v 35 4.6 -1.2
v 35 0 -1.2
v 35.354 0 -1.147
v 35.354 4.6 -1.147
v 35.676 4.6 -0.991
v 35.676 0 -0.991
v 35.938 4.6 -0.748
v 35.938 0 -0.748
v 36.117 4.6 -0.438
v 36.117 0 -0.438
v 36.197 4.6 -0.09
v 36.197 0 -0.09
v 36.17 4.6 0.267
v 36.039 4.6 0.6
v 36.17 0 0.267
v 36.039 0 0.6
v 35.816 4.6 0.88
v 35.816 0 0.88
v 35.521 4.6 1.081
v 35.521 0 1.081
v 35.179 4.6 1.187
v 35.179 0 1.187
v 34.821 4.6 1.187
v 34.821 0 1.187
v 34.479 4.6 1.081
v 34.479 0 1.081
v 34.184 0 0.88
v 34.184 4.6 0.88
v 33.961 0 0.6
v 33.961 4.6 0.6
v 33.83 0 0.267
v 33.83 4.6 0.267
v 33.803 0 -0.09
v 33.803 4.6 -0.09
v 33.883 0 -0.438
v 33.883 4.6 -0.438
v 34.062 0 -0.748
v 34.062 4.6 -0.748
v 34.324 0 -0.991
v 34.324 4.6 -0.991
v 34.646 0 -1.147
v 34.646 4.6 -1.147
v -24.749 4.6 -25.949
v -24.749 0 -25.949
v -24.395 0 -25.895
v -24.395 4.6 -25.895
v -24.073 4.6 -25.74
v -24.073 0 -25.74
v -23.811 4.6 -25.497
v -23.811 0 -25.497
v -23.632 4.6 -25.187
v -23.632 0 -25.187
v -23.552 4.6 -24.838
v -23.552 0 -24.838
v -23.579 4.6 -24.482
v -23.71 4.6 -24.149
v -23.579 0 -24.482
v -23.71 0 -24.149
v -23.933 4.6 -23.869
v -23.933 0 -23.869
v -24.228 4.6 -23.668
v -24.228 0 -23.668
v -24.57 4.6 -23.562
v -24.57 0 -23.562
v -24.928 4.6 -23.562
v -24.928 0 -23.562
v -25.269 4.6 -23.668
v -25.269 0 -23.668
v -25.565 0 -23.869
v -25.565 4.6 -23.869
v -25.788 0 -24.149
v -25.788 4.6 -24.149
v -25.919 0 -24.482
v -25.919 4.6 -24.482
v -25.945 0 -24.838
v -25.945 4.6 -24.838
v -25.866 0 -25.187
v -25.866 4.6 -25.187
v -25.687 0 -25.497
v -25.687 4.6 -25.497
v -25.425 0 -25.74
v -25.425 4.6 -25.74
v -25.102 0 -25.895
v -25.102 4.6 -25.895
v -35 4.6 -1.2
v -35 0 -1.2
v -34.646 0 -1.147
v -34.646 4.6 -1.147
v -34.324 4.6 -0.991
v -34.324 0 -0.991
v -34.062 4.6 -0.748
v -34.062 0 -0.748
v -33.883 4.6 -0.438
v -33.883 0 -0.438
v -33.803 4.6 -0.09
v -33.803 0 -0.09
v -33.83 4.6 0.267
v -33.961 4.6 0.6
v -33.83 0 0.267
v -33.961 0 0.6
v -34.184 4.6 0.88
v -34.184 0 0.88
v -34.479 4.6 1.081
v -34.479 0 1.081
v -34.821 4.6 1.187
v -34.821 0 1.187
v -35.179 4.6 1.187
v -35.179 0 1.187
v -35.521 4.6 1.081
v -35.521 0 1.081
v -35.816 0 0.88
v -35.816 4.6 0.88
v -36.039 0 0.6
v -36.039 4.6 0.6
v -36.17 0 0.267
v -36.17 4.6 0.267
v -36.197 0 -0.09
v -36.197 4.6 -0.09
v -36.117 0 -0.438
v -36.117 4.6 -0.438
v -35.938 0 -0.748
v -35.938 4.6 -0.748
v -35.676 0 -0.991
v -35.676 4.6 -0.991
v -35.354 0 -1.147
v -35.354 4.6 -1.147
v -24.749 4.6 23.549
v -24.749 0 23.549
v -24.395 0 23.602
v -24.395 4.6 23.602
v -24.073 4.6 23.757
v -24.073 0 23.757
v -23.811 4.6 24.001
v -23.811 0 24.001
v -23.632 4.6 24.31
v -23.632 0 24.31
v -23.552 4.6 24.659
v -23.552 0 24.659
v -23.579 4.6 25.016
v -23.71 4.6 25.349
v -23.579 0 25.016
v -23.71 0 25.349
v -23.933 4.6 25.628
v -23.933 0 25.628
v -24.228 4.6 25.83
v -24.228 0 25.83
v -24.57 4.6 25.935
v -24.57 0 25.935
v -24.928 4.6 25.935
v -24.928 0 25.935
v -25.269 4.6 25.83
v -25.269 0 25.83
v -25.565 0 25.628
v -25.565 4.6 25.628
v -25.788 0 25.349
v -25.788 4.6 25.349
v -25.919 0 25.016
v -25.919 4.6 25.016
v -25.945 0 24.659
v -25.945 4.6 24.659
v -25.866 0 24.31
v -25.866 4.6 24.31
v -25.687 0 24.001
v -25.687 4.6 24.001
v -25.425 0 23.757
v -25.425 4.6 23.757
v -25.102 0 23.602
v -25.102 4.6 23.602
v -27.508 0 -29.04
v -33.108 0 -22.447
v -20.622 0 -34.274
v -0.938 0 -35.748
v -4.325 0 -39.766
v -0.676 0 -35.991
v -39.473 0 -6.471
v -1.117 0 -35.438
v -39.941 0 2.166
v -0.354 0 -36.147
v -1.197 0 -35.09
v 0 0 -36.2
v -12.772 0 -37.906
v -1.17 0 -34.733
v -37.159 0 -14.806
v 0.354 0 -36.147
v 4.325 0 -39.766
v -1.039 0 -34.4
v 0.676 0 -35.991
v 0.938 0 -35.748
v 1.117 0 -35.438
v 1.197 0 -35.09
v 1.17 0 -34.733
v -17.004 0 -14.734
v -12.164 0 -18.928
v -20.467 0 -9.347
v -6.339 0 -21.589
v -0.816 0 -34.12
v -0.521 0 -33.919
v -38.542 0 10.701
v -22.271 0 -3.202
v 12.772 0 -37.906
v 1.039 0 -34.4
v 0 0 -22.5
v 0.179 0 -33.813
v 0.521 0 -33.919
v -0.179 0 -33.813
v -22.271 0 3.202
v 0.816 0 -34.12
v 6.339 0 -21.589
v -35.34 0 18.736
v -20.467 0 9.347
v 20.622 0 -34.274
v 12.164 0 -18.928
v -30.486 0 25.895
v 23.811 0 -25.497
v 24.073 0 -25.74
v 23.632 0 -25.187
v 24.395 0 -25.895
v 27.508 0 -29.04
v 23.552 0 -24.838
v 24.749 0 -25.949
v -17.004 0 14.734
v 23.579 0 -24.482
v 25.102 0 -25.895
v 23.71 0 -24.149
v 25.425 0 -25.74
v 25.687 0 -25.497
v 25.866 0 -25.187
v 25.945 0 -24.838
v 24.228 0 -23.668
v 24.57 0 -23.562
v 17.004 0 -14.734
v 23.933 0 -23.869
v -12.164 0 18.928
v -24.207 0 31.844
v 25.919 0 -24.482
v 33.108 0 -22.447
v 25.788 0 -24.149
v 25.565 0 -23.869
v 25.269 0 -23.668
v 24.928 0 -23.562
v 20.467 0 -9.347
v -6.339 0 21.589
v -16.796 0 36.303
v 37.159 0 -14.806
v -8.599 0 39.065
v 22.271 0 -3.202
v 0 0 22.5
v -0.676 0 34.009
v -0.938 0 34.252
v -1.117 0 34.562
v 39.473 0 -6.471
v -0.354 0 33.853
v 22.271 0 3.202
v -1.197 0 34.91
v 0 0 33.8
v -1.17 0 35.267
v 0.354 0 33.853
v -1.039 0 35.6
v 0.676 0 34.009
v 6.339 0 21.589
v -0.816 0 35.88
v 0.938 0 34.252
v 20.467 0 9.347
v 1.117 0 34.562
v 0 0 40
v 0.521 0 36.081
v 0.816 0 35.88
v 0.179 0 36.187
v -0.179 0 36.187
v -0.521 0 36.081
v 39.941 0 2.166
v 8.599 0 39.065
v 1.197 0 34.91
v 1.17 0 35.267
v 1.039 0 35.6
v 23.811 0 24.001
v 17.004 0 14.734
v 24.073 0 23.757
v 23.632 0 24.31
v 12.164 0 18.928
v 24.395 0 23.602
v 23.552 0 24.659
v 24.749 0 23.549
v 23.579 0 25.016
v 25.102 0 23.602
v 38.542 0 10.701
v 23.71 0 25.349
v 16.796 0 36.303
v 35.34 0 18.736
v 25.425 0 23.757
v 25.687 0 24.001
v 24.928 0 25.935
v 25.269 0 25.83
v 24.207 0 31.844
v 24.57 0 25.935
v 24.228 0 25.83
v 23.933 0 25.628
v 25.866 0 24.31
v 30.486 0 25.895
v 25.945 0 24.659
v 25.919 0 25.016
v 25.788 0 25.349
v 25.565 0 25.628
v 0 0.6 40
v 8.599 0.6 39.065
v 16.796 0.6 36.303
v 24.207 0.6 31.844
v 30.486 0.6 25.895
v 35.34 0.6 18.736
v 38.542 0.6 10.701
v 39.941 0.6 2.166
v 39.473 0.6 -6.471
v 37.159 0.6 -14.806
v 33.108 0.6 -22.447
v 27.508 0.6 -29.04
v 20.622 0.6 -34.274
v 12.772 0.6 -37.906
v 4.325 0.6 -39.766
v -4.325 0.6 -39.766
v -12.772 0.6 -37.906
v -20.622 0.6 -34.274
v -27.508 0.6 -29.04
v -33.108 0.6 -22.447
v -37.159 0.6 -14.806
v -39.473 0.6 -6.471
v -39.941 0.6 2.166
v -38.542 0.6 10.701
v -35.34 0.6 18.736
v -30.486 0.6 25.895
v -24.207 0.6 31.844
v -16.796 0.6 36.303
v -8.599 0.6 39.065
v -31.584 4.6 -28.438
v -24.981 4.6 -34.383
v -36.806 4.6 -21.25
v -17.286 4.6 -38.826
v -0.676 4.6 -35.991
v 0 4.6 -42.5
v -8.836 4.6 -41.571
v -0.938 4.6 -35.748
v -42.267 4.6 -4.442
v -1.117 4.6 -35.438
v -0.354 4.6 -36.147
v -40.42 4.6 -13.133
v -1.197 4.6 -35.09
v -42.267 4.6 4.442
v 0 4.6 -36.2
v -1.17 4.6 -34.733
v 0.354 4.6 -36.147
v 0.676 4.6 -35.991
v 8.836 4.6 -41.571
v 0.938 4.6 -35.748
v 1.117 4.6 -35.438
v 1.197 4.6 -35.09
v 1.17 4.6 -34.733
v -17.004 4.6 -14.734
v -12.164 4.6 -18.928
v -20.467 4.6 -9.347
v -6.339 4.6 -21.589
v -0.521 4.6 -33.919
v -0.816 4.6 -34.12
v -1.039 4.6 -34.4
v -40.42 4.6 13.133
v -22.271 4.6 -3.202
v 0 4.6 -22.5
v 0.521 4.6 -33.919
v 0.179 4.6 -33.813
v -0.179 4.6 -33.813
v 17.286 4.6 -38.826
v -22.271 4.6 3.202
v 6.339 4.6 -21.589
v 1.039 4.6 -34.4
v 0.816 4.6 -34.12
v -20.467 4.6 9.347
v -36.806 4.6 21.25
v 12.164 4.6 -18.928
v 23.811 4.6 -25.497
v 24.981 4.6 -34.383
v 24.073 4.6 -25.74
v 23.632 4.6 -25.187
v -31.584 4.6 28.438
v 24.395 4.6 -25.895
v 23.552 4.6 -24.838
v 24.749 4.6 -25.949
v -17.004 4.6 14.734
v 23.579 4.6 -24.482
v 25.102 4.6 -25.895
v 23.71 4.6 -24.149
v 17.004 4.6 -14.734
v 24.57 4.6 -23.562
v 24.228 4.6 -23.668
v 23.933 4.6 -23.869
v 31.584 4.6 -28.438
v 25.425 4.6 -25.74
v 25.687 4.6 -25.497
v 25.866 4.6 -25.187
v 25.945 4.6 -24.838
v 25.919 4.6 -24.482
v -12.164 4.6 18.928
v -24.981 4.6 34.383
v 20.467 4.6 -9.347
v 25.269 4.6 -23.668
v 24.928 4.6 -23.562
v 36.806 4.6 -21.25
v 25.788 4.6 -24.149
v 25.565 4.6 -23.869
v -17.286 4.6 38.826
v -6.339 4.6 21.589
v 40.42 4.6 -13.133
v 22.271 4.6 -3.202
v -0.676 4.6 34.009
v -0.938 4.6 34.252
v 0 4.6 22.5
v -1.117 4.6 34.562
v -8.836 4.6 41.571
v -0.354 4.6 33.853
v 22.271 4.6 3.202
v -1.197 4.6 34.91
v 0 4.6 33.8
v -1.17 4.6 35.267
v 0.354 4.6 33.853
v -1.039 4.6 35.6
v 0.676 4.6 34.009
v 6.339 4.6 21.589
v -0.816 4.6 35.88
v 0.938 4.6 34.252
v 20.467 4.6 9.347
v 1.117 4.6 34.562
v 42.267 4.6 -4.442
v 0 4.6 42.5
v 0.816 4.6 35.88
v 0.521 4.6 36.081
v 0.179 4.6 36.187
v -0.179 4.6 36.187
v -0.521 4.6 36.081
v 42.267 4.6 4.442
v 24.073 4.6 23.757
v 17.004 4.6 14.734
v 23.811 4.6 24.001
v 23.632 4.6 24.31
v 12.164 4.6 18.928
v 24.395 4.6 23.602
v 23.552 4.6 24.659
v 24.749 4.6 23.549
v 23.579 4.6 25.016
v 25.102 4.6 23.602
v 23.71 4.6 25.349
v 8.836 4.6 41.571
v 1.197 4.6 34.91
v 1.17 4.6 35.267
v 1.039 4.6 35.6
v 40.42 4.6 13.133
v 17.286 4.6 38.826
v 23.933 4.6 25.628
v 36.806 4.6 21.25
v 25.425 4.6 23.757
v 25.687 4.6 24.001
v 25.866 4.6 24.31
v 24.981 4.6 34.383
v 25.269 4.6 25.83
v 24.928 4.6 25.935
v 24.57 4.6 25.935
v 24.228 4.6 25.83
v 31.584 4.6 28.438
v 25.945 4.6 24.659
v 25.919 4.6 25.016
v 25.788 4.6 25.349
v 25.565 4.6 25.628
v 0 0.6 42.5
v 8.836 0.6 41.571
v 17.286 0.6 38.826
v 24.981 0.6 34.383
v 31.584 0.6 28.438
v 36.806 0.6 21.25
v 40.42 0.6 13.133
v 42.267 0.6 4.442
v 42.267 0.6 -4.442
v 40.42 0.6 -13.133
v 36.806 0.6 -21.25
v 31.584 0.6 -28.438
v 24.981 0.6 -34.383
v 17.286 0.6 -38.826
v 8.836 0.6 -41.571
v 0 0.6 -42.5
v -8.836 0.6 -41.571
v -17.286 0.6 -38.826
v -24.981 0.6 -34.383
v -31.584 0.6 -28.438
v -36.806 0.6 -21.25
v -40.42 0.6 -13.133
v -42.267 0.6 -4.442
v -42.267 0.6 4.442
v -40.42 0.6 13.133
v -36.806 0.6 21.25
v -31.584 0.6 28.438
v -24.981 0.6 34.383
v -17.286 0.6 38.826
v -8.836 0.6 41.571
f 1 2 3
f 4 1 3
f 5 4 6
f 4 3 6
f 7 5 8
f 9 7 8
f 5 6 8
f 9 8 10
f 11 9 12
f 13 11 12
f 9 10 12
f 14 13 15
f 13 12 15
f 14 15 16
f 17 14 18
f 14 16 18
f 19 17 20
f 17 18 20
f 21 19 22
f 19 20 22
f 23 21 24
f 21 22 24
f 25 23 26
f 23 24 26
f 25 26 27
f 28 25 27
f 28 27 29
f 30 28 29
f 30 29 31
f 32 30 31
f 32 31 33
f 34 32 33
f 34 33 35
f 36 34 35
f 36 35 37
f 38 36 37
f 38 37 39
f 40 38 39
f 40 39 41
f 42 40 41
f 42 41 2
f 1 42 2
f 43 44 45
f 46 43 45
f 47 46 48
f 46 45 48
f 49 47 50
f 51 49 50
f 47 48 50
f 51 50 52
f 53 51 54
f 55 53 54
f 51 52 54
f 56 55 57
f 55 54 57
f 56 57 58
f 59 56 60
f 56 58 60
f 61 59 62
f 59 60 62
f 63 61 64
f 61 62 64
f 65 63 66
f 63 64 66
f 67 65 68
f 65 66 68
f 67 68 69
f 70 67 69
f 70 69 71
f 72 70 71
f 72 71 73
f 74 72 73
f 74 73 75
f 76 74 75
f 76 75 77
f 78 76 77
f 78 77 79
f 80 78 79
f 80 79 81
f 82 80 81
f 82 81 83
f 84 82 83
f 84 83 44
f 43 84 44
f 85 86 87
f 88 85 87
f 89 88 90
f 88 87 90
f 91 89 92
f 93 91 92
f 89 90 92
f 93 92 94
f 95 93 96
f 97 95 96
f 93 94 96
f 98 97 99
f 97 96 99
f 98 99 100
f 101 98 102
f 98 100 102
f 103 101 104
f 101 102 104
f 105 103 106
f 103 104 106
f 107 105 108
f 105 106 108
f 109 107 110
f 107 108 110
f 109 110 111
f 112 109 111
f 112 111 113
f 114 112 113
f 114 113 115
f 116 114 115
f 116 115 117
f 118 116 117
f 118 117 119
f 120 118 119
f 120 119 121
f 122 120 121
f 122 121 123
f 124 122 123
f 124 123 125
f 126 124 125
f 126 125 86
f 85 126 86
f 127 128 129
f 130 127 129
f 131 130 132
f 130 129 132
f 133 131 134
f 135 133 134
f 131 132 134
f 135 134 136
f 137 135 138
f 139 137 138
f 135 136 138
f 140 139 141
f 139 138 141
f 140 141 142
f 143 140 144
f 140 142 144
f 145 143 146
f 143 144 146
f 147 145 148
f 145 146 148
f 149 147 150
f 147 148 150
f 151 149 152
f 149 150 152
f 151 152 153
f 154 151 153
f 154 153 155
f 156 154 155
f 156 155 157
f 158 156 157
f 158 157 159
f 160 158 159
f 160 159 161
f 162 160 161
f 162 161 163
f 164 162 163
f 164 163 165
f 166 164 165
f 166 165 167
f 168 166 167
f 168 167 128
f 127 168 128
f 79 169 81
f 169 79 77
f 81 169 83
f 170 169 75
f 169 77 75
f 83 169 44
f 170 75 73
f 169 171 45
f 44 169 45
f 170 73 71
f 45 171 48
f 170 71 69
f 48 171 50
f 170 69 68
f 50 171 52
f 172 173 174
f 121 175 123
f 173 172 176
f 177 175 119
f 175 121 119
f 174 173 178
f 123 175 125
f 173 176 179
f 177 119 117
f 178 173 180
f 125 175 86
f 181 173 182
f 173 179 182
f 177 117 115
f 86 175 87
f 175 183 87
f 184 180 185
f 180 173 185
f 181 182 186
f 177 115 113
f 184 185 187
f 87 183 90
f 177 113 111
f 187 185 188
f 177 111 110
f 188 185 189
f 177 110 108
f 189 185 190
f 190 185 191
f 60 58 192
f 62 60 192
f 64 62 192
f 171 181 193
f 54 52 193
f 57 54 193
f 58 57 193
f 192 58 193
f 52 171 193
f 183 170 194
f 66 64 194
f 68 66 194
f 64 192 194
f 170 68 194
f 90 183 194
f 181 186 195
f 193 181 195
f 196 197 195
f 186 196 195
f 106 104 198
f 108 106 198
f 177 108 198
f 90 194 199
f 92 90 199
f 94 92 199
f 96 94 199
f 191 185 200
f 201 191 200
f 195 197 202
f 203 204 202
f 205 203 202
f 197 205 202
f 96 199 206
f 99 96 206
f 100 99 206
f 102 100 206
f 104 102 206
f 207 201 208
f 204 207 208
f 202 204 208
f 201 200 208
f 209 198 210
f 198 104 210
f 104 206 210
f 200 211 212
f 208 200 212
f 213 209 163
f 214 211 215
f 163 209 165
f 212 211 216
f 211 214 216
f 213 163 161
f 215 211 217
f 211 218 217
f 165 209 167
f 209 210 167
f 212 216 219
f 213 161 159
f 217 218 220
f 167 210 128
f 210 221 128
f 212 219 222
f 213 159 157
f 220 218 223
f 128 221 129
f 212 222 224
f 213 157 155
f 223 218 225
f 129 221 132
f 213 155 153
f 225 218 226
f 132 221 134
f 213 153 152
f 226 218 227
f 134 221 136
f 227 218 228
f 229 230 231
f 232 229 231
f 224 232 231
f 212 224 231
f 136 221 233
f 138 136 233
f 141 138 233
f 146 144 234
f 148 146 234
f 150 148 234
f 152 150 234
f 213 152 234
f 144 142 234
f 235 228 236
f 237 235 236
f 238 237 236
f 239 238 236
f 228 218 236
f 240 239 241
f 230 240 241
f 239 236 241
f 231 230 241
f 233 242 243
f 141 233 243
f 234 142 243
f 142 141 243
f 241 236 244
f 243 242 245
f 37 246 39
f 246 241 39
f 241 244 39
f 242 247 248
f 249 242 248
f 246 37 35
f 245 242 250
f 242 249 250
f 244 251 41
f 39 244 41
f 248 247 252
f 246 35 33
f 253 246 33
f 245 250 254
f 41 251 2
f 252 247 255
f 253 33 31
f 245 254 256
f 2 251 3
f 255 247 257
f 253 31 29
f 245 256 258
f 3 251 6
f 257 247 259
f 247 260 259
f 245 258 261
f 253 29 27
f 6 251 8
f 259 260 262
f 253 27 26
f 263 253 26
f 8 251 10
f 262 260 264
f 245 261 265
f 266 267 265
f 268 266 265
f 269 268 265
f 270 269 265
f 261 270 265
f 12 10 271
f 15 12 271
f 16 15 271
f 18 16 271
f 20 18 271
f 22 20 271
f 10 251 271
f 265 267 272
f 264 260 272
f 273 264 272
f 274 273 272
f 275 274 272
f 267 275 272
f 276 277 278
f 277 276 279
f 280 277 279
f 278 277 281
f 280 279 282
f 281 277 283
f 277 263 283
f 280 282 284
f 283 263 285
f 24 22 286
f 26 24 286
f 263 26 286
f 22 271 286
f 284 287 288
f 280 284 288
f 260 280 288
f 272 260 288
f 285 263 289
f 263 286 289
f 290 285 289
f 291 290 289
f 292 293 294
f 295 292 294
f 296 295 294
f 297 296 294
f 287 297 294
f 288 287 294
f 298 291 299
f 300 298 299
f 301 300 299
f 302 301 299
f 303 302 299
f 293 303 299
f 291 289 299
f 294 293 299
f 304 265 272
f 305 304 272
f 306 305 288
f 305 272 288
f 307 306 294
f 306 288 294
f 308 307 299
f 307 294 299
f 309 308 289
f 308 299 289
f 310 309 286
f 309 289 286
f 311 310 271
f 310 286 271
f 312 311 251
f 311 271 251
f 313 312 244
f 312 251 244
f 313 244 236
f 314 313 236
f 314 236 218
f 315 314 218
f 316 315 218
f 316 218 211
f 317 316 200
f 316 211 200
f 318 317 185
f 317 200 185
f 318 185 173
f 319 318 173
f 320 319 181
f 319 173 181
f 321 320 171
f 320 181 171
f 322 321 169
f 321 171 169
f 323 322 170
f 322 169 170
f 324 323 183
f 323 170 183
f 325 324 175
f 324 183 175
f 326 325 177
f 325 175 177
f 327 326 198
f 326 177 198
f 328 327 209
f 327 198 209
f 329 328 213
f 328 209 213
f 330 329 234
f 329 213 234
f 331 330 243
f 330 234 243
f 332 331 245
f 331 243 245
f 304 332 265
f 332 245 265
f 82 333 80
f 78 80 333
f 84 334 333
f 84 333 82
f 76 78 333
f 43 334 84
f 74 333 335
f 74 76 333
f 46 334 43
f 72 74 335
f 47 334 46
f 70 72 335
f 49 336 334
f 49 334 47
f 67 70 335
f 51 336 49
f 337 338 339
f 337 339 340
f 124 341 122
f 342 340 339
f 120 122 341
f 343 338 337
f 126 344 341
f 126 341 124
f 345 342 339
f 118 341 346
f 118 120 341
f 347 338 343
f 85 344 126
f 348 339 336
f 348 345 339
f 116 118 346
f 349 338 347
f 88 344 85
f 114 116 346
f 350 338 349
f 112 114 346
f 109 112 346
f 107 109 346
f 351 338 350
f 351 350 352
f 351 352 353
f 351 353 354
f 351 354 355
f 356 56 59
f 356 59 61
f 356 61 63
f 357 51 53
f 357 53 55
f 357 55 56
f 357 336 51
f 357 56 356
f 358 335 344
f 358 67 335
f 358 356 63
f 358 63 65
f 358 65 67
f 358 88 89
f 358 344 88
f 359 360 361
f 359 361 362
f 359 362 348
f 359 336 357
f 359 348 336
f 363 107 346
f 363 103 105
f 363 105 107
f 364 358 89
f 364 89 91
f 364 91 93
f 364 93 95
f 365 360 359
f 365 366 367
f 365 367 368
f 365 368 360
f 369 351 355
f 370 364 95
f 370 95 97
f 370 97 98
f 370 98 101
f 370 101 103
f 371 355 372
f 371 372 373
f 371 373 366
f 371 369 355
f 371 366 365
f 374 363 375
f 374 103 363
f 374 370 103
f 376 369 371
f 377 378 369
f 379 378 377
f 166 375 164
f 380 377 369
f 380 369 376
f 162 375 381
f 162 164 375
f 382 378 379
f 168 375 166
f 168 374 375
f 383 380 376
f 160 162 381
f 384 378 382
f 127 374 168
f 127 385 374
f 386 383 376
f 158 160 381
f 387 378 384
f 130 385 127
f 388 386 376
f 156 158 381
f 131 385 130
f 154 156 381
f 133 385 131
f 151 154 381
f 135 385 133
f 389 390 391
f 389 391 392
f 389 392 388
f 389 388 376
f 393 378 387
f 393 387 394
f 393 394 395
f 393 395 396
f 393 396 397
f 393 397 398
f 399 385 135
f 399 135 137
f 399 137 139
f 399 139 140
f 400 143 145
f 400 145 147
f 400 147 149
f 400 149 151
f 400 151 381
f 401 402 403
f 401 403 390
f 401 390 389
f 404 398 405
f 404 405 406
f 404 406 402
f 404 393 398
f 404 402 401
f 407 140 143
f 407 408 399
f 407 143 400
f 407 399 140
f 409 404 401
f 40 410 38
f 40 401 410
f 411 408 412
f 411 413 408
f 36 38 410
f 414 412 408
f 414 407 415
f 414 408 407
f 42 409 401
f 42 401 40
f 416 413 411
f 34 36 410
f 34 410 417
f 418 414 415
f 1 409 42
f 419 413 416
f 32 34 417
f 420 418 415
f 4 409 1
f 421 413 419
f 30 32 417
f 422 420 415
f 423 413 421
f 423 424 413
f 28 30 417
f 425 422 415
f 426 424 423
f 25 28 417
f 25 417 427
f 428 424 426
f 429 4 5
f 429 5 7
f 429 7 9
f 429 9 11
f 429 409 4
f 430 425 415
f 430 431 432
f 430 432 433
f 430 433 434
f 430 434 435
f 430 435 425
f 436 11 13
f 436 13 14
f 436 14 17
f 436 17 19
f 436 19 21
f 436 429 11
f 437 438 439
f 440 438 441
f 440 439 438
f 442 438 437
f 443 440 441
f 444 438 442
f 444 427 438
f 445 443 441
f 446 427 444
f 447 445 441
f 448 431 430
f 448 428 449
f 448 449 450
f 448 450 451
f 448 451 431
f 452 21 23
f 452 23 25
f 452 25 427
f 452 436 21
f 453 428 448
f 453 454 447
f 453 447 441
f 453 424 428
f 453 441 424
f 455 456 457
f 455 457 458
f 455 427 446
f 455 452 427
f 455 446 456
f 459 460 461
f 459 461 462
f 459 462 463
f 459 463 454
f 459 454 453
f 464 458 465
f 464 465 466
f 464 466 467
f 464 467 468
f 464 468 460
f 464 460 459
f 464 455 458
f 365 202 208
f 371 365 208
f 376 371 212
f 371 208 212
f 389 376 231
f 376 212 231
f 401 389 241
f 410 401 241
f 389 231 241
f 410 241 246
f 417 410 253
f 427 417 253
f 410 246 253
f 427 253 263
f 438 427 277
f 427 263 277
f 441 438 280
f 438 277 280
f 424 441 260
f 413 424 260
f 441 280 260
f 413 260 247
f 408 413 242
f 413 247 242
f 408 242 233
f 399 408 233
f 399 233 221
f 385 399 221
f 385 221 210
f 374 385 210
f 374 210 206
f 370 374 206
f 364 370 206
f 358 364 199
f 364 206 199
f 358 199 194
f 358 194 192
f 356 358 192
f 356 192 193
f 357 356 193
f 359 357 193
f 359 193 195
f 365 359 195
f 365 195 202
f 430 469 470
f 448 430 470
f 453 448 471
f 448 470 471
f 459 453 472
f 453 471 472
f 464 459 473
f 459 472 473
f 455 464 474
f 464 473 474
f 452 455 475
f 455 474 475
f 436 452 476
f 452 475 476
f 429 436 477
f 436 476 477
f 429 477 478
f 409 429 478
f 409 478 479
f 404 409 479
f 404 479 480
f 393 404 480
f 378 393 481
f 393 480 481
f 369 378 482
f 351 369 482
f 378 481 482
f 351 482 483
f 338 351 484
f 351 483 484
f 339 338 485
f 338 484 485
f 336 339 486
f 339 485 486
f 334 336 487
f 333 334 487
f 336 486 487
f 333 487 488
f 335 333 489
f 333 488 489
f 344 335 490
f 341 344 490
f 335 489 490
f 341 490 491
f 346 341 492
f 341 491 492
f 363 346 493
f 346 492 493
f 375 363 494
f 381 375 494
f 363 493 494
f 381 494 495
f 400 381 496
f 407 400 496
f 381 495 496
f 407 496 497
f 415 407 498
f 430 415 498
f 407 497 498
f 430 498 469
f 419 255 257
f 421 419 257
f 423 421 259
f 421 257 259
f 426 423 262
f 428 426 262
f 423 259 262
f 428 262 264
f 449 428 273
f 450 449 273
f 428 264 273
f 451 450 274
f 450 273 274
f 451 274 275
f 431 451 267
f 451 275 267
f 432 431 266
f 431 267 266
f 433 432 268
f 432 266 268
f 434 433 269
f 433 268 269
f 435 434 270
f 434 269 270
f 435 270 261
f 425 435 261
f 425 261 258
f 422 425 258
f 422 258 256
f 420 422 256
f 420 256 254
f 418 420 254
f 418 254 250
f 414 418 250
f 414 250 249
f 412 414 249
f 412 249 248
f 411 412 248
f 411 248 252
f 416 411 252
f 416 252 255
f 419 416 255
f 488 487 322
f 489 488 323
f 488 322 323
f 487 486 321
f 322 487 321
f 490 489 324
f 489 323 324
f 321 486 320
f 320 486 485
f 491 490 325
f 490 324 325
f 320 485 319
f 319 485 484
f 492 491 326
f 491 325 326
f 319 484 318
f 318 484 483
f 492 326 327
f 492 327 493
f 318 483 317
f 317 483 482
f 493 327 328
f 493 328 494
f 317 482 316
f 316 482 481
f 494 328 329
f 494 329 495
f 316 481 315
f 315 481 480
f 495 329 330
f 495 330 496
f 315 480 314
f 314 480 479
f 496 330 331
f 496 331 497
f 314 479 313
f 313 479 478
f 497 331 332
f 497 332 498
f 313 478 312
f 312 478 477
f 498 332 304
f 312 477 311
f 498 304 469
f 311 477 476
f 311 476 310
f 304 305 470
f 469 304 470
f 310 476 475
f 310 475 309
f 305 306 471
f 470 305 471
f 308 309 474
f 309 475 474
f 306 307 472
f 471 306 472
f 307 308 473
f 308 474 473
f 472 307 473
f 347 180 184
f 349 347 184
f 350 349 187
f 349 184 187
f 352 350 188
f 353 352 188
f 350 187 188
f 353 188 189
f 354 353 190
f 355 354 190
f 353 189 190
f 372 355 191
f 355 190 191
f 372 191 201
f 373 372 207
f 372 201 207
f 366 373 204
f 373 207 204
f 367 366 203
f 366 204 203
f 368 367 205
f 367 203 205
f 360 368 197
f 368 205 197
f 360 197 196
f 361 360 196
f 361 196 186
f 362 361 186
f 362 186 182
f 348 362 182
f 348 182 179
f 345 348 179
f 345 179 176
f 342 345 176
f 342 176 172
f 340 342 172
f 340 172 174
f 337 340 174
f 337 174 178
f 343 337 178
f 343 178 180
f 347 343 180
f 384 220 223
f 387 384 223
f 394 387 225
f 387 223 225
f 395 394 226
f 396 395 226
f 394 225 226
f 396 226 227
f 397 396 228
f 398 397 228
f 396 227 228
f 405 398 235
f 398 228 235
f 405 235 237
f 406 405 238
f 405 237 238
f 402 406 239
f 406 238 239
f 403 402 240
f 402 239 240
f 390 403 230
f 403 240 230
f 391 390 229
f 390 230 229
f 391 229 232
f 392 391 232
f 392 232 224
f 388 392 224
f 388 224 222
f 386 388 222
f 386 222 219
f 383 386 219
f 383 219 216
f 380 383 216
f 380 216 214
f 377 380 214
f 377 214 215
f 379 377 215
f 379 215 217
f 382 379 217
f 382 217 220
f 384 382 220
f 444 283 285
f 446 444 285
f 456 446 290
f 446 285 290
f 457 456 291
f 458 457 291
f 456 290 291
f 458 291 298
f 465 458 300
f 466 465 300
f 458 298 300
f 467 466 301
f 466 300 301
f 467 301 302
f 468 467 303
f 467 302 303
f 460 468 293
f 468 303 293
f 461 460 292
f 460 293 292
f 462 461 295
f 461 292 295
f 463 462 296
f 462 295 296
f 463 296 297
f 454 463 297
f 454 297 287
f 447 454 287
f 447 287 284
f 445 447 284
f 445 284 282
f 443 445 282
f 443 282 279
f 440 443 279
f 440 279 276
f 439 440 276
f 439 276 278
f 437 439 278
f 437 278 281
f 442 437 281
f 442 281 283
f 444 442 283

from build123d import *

# Parameters (mm, degrees)
SKETCH1_R           = 40
BOSS_EXTRUDE1_DEPTH = 0.6
SKETCH2_R           = 42.5
BOSS_EXTRUDE2_DEPTH = 4
SKETCH3_R           = 22.5
CUT_EXTRUDE1_DEPTH  = 61.279847379
SKETCH4_R           = 1.2
CUT_EXTRUDE4_DEPTH  = 61.279847379


with BuildPart() as part:
    # Sketch1 → Boss-Extrude1 (new body)
    with BuildSketch(Plane(origin=(0, 0, 0), x_dir=(1, 0, 0), z_dir=(0, 1, 0))):
        with Locations(Location((0, 0, 0), (0, 0, 270))):
            Circle(SKETCH1_R)
    extrude(amount=BOSS_EXTRUDE1_DEPTH)

    # Sketch2 → Boss-Extrude2 (add)
    with BuildSketch(Plane(origin=(0, 0.6, 0), x_dir=(1, 0, 0), z_dir=(0, 1, 0))):
        with Locations(Location((0, 0, 0), (0, 0, 270))):
            Circle(SKETCH2_R)
    extrude(amount=BOSS_EXTRUDE2_DEPTH)

    # Sketch3 → Cut-Extrude1 (cut, through all)
    with BuildSketch(Plane.XZ):
        with Locations(Location((0, 0, 0), (0, 0, 270))):
            Circle(SKETCH3_R)
    extrude(amount=-CUT_EXTRUDE1_DEPTH, mode=Mode.SUBTRACT)

    # Sketch4 → Cut-Extrude4 (cut, through all)
    with BuildSketch(Plane.XZ):
        with Locations(Location((0, 35, 0), (0, 0, 270))):
            Circle(SKETCH4_R)
        with Locations(Location((24.748737342, 24.748737342, 0), (0, 0, 270))):
            Circle(SKETCH4_R)
        with Locations(Location((35, 0, 0), (0, 0, 270))):
            Circle(SKETCH4_R)
        with Locations(Location((24.748737342, -24.748737342, 0), (0, 0, 270))):
            Circle(SKETCH4_R)
        with Locations(Location((0, -35, 0), (0, 0, 270))):
            Circle(SKETCH4_R)
        with Locations(Location((-24.748737342, -24.748737342, 0), (0, 0, 270))):
            Circle(SKETCH4_R)
        with Locations(Location((-35, 0, 0), (0, 0, 270))):
            Circle(SKETCH4_R)
        with Locations(Location((-24.748737342, 24.748737342, 0), (0, 0, 270))):
            Circle(SKETCH4_R)
    extrude(amount=-CUT_EXTRUDE4_DEPTH, mode=Mode.SUBTRACT)


solid = part.part
